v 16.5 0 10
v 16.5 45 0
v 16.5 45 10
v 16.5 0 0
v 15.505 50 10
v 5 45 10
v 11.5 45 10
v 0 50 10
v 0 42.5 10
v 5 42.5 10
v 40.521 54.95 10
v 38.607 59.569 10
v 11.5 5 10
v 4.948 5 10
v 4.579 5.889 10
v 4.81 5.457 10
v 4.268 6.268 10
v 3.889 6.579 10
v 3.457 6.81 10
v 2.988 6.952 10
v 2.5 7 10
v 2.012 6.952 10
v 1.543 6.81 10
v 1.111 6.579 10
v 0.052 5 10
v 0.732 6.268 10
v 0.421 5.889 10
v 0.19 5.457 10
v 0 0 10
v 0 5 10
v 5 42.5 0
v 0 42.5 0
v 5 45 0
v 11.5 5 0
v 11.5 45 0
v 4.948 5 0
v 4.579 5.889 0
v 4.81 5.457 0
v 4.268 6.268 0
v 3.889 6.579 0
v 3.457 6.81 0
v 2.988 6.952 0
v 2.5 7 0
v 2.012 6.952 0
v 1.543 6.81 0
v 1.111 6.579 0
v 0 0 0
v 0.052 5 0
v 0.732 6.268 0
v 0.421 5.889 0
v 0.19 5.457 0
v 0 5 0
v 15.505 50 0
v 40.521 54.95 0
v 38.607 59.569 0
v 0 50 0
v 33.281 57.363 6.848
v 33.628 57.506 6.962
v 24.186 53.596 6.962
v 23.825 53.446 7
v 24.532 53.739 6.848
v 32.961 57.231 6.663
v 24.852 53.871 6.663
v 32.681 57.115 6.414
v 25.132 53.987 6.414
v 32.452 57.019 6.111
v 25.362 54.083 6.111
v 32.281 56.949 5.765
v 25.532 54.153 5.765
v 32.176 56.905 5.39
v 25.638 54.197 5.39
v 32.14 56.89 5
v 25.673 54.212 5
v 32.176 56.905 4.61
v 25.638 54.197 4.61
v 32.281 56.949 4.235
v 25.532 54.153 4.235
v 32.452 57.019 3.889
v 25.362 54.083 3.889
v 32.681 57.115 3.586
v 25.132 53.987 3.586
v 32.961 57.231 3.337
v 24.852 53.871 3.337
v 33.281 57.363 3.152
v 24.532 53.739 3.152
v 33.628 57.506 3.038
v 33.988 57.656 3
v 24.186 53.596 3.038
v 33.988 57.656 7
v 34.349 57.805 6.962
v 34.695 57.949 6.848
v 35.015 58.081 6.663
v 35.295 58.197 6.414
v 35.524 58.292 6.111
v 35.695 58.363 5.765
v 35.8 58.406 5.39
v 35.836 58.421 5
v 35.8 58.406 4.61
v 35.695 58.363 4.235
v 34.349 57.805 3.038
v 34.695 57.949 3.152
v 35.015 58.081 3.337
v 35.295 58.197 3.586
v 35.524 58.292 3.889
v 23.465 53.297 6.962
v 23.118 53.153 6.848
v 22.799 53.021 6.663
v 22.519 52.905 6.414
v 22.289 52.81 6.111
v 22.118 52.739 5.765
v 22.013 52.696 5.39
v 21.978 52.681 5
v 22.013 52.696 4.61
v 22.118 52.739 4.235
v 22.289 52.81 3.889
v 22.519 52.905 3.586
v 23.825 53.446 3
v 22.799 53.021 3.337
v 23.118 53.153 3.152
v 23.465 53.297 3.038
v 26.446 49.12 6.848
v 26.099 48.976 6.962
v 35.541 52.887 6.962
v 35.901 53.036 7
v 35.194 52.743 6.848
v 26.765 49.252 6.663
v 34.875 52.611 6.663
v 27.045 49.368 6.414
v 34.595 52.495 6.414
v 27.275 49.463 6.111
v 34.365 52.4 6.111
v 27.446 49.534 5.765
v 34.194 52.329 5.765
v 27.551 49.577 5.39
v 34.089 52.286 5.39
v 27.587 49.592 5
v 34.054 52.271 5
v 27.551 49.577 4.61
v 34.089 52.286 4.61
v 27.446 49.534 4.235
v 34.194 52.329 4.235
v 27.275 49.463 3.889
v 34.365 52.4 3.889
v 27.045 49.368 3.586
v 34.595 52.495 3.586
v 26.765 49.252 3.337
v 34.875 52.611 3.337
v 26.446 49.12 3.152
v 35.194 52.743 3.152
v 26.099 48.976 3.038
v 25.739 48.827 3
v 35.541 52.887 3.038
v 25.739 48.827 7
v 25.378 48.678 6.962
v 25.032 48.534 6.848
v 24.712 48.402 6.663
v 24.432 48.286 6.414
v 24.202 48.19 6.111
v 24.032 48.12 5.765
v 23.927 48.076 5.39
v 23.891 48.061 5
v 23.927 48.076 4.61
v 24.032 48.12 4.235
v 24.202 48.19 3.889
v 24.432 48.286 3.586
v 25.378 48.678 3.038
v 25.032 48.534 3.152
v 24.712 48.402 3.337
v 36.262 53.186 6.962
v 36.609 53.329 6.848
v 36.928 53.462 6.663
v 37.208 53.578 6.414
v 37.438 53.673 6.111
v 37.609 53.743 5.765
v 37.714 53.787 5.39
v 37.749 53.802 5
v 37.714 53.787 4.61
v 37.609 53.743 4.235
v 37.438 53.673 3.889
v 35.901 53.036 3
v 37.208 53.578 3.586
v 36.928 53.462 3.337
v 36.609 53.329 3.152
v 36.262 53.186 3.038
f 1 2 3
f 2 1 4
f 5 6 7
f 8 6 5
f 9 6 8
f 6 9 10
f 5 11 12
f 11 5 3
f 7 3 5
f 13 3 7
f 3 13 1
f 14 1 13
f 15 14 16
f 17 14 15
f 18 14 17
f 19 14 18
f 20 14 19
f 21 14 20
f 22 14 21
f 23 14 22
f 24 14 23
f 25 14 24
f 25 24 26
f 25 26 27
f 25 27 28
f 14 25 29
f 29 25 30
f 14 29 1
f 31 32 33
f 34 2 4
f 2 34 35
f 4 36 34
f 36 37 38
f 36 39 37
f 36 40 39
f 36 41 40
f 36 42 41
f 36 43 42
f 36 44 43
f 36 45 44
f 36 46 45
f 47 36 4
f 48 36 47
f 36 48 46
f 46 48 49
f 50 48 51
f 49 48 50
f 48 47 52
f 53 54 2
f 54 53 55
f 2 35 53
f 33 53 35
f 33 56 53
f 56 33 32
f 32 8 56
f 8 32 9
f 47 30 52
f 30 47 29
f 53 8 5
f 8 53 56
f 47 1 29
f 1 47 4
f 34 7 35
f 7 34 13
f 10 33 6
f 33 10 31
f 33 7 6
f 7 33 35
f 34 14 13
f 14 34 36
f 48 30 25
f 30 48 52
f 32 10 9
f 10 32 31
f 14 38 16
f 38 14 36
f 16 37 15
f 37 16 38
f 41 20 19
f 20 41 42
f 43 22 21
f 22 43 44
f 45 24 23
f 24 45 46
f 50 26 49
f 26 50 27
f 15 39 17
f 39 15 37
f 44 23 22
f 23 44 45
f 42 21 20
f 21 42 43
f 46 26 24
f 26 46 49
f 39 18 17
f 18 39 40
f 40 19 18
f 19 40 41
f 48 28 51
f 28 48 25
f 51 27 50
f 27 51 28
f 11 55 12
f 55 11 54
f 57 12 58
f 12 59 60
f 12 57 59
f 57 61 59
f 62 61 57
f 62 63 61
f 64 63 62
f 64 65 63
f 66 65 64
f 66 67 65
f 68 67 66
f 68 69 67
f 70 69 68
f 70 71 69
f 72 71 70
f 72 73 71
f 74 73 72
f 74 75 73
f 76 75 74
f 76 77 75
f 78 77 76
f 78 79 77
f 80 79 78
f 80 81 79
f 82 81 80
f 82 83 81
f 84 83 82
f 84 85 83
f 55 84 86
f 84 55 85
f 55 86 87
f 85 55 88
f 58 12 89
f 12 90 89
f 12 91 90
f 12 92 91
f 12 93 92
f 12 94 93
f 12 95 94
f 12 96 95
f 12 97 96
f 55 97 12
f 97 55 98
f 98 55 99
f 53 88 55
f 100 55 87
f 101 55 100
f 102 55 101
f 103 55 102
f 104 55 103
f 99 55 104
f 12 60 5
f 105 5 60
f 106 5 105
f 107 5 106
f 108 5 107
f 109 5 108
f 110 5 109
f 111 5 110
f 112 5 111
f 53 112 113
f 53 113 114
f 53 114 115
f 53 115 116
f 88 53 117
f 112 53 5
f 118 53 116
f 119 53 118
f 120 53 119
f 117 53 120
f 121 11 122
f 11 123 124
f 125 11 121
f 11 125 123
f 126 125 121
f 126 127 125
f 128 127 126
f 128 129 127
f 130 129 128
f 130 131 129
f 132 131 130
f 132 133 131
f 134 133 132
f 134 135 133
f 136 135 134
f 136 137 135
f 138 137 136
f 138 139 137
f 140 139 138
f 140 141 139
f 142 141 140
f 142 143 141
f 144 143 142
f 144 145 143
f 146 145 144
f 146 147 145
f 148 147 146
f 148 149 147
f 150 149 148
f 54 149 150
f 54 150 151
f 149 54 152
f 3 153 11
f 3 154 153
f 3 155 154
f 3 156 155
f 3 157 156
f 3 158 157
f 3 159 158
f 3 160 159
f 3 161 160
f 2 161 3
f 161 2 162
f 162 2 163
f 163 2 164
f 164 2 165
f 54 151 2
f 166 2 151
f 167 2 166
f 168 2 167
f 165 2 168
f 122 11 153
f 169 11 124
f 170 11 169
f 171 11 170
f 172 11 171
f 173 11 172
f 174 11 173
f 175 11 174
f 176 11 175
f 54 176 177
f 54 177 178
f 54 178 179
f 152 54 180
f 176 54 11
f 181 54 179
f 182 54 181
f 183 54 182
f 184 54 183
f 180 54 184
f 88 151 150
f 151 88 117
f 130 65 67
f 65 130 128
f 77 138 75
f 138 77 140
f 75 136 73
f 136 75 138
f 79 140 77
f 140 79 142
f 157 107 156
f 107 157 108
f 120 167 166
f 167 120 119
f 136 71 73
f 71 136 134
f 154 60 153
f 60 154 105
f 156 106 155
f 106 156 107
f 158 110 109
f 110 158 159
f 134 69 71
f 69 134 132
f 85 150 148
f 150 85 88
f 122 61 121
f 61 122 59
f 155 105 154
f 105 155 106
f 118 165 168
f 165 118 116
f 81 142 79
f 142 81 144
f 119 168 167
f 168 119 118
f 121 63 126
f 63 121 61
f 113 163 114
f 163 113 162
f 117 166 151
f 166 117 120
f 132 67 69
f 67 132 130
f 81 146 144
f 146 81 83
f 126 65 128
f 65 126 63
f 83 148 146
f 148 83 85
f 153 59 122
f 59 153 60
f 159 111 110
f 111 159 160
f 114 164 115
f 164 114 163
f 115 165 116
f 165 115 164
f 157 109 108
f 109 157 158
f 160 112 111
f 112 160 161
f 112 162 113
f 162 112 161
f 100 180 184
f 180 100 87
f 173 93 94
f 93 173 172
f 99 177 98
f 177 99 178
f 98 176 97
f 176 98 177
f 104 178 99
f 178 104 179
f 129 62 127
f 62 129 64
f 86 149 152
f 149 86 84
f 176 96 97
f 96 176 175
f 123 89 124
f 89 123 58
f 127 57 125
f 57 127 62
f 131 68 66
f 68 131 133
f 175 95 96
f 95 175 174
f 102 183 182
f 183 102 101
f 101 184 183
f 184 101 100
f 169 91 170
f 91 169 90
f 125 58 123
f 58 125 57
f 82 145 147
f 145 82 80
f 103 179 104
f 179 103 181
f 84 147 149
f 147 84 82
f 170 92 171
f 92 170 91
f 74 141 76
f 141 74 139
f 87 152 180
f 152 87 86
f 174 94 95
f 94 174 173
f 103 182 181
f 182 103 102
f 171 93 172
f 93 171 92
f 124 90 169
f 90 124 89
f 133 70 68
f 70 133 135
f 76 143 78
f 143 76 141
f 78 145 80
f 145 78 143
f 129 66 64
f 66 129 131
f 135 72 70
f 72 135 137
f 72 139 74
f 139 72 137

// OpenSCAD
//
$fn=32;
base = [6.5, 40, 10];
wall = 5;
a = 22.5;
hdist = [10, 11, 5];

module bconn(){
    union(){
        difference(){
            cube(base + [2*wall, 2*wall, 0]);
            translate([wall, wall, 0]) cube(base);
            translate([0, wall, 0]) cube([wall, base.y- 0.5*wall, base.z]);
        }
        translate([wall/2, 0.9*wall, 0]) cylinder(d=wall, h=base.z);
    }
}

module lconn(){
    difference(){
        cube([hdist.x+hdist.y+hdist.z, wall, base.z]);
        translate([hdist.x, 0, base.z/2]) rotate([-90, 0, 0]) cylinder(d=4, h=wall);
        translate([hdist.x+hdist.y, 0, base.z/2]) rotate([-90, 0, 0]) cylinder(d=4, h=wall);
    }

}

union(){
    bconn();
    translate([base.x+2*wall, base.y+wall, 0]) rotate([0, 0, a]) lconn();
}
